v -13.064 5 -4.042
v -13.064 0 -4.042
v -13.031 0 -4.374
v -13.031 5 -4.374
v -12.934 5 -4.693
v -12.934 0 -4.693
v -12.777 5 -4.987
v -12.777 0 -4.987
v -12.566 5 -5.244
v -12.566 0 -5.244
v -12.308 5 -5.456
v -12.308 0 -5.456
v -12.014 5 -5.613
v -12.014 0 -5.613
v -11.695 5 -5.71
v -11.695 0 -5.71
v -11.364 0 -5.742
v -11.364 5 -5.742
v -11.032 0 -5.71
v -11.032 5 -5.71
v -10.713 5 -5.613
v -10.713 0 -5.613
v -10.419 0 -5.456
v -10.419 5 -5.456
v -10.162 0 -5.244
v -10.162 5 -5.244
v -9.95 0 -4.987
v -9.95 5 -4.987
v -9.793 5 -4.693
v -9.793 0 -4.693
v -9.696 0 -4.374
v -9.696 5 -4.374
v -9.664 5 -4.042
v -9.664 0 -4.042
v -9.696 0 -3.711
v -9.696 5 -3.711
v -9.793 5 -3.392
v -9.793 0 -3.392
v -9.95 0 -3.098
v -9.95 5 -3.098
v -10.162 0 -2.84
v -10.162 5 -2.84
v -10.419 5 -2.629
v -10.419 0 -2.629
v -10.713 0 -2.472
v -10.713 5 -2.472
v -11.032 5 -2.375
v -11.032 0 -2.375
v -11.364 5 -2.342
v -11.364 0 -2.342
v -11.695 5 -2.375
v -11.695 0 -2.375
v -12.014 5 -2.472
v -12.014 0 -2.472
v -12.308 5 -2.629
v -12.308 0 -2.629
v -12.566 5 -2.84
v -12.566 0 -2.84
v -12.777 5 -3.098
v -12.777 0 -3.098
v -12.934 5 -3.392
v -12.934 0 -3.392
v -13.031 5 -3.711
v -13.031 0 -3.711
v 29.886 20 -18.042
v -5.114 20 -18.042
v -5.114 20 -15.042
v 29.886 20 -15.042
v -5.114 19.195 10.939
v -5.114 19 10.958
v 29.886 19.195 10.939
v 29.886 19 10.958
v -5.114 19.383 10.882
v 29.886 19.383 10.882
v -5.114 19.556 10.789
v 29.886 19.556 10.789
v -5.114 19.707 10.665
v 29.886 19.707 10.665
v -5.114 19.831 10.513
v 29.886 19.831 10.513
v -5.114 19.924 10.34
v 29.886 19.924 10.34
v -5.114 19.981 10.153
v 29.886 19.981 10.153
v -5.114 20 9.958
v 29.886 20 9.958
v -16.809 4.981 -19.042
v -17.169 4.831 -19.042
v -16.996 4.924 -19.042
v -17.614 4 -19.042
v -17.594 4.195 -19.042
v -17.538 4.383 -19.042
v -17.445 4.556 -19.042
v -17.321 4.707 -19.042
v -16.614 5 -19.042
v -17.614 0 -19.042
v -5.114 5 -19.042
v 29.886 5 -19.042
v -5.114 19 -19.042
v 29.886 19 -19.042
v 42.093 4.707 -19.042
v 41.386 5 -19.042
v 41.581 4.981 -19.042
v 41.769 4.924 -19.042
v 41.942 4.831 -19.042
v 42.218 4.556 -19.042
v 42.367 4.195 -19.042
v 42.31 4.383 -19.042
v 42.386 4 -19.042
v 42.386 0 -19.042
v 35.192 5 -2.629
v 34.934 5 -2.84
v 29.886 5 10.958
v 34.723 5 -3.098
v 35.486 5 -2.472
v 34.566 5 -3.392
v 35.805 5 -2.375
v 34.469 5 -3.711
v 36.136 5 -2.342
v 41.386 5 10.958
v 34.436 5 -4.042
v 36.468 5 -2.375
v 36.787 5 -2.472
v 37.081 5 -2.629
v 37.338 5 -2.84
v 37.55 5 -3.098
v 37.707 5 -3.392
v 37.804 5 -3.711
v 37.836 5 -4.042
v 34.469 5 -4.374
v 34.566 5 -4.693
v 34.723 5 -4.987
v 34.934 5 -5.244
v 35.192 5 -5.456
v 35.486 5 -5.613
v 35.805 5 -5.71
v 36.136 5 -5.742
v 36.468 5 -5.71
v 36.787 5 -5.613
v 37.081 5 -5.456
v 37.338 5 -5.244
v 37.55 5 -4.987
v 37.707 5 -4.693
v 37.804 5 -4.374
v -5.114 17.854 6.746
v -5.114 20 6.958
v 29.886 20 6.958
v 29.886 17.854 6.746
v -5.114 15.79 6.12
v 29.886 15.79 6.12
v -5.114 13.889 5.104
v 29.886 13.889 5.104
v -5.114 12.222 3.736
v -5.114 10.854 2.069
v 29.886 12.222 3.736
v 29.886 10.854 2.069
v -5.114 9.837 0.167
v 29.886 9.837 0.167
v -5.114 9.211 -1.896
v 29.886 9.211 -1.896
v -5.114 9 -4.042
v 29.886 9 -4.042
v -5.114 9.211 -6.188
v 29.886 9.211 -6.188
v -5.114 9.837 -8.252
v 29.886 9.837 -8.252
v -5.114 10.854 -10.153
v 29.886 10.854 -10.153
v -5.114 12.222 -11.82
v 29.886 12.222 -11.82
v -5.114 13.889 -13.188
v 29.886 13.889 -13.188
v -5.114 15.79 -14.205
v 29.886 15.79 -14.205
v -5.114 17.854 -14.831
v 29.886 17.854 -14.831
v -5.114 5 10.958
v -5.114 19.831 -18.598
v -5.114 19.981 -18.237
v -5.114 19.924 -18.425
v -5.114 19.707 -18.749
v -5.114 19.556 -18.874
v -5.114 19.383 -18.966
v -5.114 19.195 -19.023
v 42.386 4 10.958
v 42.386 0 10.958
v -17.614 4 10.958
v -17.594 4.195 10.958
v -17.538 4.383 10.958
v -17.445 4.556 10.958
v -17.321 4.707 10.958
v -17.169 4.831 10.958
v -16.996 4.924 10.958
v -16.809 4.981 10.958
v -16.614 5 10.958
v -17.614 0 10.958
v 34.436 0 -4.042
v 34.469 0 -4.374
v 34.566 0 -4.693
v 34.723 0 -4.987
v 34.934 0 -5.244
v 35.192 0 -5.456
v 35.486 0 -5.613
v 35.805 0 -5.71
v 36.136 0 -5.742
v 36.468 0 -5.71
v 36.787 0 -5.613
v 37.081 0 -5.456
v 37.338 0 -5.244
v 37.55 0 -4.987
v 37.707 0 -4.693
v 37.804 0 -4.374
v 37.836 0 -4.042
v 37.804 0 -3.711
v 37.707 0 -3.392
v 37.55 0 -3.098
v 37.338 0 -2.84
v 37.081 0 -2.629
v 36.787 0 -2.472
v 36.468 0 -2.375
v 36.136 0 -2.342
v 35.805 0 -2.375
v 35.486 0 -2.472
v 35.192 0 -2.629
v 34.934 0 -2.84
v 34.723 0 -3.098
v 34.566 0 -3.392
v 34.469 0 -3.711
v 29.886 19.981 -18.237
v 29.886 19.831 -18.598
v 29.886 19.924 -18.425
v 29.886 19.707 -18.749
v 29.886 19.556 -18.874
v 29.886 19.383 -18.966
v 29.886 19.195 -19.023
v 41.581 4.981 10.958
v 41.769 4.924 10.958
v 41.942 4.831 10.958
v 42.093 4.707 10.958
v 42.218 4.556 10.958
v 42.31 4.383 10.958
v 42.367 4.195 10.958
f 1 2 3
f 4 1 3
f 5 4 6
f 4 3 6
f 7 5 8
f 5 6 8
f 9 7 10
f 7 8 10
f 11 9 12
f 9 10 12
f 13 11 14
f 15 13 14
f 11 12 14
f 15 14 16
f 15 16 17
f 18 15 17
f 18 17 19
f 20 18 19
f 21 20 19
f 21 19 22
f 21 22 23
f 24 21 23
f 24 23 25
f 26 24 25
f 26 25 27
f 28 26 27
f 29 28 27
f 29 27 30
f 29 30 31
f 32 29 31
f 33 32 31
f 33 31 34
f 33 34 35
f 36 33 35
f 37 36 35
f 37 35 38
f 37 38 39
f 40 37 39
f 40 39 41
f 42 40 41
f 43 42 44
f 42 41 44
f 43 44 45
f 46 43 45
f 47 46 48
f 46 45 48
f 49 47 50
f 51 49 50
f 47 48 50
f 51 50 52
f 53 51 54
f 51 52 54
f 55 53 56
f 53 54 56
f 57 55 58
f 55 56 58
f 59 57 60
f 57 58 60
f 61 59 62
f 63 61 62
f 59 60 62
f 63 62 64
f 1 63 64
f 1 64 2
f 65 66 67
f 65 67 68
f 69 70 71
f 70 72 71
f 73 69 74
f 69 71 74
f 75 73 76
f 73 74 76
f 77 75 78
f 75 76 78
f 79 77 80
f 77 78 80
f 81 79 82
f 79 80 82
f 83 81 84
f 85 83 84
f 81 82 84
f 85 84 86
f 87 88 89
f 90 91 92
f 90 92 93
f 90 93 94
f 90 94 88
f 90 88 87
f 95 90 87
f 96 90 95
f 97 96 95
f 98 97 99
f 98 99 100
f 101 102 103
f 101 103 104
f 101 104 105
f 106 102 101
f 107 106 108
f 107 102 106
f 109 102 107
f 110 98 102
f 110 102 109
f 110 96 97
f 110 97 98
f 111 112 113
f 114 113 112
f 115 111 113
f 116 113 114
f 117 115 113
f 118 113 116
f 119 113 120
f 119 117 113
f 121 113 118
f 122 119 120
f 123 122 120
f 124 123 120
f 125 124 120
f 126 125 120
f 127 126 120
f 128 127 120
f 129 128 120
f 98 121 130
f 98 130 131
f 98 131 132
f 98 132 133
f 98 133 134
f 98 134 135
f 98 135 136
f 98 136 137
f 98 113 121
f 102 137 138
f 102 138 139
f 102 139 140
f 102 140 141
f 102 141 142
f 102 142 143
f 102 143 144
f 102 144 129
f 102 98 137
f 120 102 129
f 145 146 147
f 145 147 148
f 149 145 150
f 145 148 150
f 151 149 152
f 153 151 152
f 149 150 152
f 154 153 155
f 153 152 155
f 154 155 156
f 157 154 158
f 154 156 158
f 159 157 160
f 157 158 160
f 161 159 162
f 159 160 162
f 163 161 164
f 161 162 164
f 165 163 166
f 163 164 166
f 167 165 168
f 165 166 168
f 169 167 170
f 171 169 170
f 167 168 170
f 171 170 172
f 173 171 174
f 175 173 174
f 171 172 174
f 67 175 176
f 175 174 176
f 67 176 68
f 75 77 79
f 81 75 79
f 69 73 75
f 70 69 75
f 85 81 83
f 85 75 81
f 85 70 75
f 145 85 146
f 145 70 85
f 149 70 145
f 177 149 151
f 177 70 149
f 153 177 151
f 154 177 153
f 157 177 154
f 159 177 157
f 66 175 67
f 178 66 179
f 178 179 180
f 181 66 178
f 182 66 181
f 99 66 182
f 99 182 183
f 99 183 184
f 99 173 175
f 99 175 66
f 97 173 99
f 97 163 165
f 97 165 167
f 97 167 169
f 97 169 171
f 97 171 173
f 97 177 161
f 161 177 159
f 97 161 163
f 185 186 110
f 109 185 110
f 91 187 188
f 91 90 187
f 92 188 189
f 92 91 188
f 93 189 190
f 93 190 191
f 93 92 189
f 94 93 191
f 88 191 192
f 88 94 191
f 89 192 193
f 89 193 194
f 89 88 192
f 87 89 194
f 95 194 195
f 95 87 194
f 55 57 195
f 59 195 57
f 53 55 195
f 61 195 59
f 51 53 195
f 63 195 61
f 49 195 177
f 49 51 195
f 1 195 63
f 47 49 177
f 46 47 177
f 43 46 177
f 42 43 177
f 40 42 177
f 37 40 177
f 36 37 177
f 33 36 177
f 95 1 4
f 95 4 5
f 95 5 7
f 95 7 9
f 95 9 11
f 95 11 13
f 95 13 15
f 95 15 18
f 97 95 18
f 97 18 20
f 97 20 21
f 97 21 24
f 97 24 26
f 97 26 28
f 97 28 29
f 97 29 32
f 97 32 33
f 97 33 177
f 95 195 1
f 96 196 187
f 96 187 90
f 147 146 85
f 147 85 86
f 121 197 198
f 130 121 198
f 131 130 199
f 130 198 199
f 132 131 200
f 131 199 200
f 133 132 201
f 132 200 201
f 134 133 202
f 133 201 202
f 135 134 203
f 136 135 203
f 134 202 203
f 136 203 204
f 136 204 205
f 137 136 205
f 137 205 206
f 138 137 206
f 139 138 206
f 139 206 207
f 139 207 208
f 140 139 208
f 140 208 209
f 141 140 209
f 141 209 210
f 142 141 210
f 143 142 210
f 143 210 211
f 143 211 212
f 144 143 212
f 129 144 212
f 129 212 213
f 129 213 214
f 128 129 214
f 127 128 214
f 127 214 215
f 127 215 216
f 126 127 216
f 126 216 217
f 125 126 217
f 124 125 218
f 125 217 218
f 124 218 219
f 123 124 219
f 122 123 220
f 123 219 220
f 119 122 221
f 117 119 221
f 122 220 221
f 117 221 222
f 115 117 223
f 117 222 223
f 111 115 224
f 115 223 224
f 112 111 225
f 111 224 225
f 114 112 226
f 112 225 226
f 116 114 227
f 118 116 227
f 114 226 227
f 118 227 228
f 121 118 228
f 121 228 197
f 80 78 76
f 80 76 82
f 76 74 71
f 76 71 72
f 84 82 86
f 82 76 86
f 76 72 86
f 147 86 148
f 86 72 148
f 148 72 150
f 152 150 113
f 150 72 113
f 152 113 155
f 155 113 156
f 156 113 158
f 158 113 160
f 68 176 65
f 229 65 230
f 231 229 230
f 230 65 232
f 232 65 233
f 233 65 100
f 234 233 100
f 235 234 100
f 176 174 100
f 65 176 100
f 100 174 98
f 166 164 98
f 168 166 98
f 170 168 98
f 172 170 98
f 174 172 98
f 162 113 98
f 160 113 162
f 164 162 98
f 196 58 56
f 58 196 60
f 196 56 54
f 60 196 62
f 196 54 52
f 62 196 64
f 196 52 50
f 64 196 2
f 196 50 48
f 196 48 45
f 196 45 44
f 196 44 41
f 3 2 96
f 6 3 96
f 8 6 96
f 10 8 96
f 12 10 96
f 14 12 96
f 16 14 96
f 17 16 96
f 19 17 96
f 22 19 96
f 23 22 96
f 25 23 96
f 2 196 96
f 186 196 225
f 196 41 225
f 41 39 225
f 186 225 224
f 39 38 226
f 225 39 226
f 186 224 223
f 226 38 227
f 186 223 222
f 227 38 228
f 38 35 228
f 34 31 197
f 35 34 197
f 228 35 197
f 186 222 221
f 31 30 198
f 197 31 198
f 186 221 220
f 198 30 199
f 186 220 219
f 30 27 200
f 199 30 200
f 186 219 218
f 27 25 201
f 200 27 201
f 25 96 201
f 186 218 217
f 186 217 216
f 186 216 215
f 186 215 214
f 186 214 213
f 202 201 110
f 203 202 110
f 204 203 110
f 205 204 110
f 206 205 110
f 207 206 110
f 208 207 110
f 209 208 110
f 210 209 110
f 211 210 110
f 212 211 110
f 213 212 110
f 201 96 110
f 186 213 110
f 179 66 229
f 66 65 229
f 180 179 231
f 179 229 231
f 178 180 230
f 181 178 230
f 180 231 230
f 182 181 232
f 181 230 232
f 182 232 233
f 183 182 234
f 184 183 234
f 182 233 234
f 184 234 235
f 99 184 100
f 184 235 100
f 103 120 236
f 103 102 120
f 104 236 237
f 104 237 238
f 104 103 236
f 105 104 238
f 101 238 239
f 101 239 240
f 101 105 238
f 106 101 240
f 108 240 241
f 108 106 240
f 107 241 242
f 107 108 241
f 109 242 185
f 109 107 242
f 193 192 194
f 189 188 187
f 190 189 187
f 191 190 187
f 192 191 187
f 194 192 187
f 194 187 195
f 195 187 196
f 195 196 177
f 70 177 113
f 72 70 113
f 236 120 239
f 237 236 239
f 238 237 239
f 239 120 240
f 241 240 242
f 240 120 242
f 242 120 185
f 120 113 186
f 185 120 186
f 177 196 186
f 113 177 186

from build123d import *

# Parameters (mm, degrees)
SKETCH1_W            = 60
SKETCH1_H            = 30
BOSS_EXTRUDE1_DEPTH  = 5
SKETCH2_W            = 35
SKETCH2_H            = 30
BOSS_EXTRUDE2_DEPTH  = 15
SKETCH4_R            = 11
CUT_EXTRUDE1_DEPTH   = 48.5
M3_CLEARANCE_HOLE1_D = 3.4
FILLET1_R            = 1
FILLET2_R            = 1
FILLET3_R            = 1
FILLET4_R            = 1


with BuildPart() as part:
    # Sketch1 → Boss-Extrude1 (new body)
    with BuildSketch(Plane(origin=(0, 0, 0), x_dir=(1, 0, 0), z_dir=(0, 1, 0))):
        with Locations((12.386363636, 4.042207792)):
            Rectangle(SKETCH1_W, SKETCH1_H)
    extrude(amount=BOSS_EXTRUDE1_DEPTH)

    # Sketch2 → Boss-Extrude2 (add)
    with BuildSketch(Plane(origin=(0, 5, 0), x_dir=(1, 0, 0), z_dir=(0, 1, 0))):
        with Locations((12.386363636, 4.042207792)):
            Rectangle(SKETCH2_W, SKETCH2_H)
    extrude(amount=BOSS_EXTRUDE2_DEPTH)

    # Sketch4 → Cut-Extrude1 (cut, through all)
    with BuildSketch(Plane(origin=(29.886363636, 0, 0), x_dir=(0, 0, -1), z_dir=(1, 0, 0))):
        with Locations((4.042207792, 20)):
            Circle(SKETCH4_R)
    extrude(amount=-CUT_EXTRUDE1_DEPTH, mode=Mode.SUBTRACT)

    # M3 Clearance Hole1 (through all)
    with Locations(Plane(origin=(0, 5, 0), x_dir=(1, 0, 0), z_dir=(0, 1, 0))):
        with Locations((36.136363636, 4.042207792), (-11.363636364, 4.042207792)):
            Hole(M3_CLEARANCE_HOLE1_D / 2)

    # Fillet1
    fillet1_edges = [part.edges().sort_by_distance(p)[0] for p in [
        (12.386363636, 20, 10.957792208),
    ]]
    fillet(fillet1_edges, radius=FILLET1_R)

    # Fillet2
    fillet2_edges = [part.edges().sort_by_distance(p)[0] for p in [
        (12.386363636, 20, -19.042207792),
    ]]
    fillet(fillet2_edges, radius=FILLET2_R)

    # Fillet3
    fillet3_edges = [part.edges().sort_by_distance(p)[0] for p in [
        (42.386363636, 5, -4.042207792),
    ]]
    fillet(fillet3_edges, radius=FILLET3_R)

    # Fillet4
    fillet4_edges = [part.edges().sort_by_distance(p)[0] for p in [
        (-17.613636364, 5, -4.042207792),
    ]]
    fillet(fillet4_edges, radius=FILLET4_R)


solid = part.part
